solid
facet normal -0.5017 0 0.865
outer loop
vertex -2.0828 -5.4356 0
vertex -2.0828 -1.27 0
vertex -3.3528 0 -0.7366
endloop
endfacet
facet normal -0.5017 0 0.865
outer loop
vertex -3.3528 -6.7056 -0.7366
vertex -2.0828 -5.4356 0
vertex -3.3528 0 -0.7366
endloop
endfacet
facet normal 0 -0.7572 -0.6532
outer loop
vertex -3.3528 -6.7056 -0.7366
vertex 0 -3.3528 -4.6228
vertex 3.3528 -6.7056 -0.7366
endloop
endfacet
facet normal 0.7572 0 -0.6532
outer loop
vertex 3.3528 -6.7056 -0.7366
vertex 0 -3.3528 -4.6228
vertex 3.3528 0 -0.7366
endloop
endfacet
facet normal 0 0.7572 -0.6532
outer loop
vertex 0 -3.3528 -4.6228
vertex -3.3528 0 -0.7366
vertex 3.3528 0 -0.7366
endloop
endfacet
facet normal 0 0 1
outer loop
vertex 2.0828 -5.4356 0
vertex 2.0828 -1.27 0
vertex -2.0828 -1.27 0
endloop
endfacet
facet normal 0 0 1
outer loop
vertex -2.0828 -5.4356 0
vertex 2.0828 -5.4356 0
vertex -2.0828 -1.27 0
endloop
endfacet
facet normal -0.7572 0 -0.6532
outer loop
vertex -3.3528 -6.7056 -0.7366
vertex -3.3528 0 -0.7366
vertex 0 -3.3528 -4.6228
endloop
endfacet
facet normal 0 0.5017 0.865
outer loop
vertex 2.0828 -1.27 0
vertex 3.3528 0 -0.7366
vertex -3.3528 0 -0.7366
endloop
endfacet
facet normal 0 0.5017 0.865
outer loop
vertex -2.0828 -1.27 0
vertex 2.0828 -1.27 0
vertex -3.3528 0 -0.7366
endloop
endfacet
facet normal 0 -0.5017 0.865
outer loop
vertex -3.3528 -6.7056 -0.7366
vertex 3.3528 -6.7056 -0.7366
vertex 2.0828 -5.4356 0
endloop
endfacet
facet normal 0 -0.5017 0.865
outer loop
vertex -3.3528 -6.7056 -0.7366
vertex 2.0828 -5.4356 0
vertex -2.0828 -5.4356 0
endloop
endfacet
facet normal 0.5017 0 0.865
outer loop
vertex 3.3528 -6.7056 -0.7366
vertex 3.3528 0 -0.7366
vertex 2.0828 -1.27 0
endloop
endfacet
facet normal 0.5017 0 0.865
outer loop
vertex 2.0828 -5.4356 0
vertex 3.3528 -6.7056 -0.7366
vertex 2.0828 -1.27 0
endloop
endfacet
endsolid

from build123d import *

# Parameters (mm, degrees)
F1_DEPTH      = 6.7056
F2_SIZE2      = 0.7366
F2_SIZE       = 1.27
F4_DEPTH      = 25
F4_DEPTH_BACK = 25


with BuildPart() as f1:
    # F0 (on Front) → F1 (new body)
    with BuildSketch(Plane.XZ):
        Polygon((2.0828, 0), (0, 0), (-2.0828, 0), (-3.3528, -0.7366), (0, -4.6228), (3.3528, -0.7366), align=None)
    extrude(amount=F1_DEPTH)

    # F2
    f2_edges = [f1.edges().sort_by_distance(p)[0] for p in [
        (0, -6.7056, 0),
        (0, 0, 0),
    ]]
    chamfer(f2_edges, length=F2_SIZE, length2=F2_SIZE2)

    # F3 (on Right) → F4 (cut, two sides)
    with BuildSketch(Plane.YZ) as f4_sk:
        Polygon((-3.3528, -4.6228), (-6.7056, -0.7366), (-7.370114, -5.010986), (0.519709, -5.010986), (0, -0.7366), align=None)
    extrude(amount=F4_DEPTH, mode=Mode.SUBTRACT)
    extrude(f4_sk.sketch, amount=-F4_DEPTH_BACK, mode=Mode.SUBTRACT)


solid = f1.part
